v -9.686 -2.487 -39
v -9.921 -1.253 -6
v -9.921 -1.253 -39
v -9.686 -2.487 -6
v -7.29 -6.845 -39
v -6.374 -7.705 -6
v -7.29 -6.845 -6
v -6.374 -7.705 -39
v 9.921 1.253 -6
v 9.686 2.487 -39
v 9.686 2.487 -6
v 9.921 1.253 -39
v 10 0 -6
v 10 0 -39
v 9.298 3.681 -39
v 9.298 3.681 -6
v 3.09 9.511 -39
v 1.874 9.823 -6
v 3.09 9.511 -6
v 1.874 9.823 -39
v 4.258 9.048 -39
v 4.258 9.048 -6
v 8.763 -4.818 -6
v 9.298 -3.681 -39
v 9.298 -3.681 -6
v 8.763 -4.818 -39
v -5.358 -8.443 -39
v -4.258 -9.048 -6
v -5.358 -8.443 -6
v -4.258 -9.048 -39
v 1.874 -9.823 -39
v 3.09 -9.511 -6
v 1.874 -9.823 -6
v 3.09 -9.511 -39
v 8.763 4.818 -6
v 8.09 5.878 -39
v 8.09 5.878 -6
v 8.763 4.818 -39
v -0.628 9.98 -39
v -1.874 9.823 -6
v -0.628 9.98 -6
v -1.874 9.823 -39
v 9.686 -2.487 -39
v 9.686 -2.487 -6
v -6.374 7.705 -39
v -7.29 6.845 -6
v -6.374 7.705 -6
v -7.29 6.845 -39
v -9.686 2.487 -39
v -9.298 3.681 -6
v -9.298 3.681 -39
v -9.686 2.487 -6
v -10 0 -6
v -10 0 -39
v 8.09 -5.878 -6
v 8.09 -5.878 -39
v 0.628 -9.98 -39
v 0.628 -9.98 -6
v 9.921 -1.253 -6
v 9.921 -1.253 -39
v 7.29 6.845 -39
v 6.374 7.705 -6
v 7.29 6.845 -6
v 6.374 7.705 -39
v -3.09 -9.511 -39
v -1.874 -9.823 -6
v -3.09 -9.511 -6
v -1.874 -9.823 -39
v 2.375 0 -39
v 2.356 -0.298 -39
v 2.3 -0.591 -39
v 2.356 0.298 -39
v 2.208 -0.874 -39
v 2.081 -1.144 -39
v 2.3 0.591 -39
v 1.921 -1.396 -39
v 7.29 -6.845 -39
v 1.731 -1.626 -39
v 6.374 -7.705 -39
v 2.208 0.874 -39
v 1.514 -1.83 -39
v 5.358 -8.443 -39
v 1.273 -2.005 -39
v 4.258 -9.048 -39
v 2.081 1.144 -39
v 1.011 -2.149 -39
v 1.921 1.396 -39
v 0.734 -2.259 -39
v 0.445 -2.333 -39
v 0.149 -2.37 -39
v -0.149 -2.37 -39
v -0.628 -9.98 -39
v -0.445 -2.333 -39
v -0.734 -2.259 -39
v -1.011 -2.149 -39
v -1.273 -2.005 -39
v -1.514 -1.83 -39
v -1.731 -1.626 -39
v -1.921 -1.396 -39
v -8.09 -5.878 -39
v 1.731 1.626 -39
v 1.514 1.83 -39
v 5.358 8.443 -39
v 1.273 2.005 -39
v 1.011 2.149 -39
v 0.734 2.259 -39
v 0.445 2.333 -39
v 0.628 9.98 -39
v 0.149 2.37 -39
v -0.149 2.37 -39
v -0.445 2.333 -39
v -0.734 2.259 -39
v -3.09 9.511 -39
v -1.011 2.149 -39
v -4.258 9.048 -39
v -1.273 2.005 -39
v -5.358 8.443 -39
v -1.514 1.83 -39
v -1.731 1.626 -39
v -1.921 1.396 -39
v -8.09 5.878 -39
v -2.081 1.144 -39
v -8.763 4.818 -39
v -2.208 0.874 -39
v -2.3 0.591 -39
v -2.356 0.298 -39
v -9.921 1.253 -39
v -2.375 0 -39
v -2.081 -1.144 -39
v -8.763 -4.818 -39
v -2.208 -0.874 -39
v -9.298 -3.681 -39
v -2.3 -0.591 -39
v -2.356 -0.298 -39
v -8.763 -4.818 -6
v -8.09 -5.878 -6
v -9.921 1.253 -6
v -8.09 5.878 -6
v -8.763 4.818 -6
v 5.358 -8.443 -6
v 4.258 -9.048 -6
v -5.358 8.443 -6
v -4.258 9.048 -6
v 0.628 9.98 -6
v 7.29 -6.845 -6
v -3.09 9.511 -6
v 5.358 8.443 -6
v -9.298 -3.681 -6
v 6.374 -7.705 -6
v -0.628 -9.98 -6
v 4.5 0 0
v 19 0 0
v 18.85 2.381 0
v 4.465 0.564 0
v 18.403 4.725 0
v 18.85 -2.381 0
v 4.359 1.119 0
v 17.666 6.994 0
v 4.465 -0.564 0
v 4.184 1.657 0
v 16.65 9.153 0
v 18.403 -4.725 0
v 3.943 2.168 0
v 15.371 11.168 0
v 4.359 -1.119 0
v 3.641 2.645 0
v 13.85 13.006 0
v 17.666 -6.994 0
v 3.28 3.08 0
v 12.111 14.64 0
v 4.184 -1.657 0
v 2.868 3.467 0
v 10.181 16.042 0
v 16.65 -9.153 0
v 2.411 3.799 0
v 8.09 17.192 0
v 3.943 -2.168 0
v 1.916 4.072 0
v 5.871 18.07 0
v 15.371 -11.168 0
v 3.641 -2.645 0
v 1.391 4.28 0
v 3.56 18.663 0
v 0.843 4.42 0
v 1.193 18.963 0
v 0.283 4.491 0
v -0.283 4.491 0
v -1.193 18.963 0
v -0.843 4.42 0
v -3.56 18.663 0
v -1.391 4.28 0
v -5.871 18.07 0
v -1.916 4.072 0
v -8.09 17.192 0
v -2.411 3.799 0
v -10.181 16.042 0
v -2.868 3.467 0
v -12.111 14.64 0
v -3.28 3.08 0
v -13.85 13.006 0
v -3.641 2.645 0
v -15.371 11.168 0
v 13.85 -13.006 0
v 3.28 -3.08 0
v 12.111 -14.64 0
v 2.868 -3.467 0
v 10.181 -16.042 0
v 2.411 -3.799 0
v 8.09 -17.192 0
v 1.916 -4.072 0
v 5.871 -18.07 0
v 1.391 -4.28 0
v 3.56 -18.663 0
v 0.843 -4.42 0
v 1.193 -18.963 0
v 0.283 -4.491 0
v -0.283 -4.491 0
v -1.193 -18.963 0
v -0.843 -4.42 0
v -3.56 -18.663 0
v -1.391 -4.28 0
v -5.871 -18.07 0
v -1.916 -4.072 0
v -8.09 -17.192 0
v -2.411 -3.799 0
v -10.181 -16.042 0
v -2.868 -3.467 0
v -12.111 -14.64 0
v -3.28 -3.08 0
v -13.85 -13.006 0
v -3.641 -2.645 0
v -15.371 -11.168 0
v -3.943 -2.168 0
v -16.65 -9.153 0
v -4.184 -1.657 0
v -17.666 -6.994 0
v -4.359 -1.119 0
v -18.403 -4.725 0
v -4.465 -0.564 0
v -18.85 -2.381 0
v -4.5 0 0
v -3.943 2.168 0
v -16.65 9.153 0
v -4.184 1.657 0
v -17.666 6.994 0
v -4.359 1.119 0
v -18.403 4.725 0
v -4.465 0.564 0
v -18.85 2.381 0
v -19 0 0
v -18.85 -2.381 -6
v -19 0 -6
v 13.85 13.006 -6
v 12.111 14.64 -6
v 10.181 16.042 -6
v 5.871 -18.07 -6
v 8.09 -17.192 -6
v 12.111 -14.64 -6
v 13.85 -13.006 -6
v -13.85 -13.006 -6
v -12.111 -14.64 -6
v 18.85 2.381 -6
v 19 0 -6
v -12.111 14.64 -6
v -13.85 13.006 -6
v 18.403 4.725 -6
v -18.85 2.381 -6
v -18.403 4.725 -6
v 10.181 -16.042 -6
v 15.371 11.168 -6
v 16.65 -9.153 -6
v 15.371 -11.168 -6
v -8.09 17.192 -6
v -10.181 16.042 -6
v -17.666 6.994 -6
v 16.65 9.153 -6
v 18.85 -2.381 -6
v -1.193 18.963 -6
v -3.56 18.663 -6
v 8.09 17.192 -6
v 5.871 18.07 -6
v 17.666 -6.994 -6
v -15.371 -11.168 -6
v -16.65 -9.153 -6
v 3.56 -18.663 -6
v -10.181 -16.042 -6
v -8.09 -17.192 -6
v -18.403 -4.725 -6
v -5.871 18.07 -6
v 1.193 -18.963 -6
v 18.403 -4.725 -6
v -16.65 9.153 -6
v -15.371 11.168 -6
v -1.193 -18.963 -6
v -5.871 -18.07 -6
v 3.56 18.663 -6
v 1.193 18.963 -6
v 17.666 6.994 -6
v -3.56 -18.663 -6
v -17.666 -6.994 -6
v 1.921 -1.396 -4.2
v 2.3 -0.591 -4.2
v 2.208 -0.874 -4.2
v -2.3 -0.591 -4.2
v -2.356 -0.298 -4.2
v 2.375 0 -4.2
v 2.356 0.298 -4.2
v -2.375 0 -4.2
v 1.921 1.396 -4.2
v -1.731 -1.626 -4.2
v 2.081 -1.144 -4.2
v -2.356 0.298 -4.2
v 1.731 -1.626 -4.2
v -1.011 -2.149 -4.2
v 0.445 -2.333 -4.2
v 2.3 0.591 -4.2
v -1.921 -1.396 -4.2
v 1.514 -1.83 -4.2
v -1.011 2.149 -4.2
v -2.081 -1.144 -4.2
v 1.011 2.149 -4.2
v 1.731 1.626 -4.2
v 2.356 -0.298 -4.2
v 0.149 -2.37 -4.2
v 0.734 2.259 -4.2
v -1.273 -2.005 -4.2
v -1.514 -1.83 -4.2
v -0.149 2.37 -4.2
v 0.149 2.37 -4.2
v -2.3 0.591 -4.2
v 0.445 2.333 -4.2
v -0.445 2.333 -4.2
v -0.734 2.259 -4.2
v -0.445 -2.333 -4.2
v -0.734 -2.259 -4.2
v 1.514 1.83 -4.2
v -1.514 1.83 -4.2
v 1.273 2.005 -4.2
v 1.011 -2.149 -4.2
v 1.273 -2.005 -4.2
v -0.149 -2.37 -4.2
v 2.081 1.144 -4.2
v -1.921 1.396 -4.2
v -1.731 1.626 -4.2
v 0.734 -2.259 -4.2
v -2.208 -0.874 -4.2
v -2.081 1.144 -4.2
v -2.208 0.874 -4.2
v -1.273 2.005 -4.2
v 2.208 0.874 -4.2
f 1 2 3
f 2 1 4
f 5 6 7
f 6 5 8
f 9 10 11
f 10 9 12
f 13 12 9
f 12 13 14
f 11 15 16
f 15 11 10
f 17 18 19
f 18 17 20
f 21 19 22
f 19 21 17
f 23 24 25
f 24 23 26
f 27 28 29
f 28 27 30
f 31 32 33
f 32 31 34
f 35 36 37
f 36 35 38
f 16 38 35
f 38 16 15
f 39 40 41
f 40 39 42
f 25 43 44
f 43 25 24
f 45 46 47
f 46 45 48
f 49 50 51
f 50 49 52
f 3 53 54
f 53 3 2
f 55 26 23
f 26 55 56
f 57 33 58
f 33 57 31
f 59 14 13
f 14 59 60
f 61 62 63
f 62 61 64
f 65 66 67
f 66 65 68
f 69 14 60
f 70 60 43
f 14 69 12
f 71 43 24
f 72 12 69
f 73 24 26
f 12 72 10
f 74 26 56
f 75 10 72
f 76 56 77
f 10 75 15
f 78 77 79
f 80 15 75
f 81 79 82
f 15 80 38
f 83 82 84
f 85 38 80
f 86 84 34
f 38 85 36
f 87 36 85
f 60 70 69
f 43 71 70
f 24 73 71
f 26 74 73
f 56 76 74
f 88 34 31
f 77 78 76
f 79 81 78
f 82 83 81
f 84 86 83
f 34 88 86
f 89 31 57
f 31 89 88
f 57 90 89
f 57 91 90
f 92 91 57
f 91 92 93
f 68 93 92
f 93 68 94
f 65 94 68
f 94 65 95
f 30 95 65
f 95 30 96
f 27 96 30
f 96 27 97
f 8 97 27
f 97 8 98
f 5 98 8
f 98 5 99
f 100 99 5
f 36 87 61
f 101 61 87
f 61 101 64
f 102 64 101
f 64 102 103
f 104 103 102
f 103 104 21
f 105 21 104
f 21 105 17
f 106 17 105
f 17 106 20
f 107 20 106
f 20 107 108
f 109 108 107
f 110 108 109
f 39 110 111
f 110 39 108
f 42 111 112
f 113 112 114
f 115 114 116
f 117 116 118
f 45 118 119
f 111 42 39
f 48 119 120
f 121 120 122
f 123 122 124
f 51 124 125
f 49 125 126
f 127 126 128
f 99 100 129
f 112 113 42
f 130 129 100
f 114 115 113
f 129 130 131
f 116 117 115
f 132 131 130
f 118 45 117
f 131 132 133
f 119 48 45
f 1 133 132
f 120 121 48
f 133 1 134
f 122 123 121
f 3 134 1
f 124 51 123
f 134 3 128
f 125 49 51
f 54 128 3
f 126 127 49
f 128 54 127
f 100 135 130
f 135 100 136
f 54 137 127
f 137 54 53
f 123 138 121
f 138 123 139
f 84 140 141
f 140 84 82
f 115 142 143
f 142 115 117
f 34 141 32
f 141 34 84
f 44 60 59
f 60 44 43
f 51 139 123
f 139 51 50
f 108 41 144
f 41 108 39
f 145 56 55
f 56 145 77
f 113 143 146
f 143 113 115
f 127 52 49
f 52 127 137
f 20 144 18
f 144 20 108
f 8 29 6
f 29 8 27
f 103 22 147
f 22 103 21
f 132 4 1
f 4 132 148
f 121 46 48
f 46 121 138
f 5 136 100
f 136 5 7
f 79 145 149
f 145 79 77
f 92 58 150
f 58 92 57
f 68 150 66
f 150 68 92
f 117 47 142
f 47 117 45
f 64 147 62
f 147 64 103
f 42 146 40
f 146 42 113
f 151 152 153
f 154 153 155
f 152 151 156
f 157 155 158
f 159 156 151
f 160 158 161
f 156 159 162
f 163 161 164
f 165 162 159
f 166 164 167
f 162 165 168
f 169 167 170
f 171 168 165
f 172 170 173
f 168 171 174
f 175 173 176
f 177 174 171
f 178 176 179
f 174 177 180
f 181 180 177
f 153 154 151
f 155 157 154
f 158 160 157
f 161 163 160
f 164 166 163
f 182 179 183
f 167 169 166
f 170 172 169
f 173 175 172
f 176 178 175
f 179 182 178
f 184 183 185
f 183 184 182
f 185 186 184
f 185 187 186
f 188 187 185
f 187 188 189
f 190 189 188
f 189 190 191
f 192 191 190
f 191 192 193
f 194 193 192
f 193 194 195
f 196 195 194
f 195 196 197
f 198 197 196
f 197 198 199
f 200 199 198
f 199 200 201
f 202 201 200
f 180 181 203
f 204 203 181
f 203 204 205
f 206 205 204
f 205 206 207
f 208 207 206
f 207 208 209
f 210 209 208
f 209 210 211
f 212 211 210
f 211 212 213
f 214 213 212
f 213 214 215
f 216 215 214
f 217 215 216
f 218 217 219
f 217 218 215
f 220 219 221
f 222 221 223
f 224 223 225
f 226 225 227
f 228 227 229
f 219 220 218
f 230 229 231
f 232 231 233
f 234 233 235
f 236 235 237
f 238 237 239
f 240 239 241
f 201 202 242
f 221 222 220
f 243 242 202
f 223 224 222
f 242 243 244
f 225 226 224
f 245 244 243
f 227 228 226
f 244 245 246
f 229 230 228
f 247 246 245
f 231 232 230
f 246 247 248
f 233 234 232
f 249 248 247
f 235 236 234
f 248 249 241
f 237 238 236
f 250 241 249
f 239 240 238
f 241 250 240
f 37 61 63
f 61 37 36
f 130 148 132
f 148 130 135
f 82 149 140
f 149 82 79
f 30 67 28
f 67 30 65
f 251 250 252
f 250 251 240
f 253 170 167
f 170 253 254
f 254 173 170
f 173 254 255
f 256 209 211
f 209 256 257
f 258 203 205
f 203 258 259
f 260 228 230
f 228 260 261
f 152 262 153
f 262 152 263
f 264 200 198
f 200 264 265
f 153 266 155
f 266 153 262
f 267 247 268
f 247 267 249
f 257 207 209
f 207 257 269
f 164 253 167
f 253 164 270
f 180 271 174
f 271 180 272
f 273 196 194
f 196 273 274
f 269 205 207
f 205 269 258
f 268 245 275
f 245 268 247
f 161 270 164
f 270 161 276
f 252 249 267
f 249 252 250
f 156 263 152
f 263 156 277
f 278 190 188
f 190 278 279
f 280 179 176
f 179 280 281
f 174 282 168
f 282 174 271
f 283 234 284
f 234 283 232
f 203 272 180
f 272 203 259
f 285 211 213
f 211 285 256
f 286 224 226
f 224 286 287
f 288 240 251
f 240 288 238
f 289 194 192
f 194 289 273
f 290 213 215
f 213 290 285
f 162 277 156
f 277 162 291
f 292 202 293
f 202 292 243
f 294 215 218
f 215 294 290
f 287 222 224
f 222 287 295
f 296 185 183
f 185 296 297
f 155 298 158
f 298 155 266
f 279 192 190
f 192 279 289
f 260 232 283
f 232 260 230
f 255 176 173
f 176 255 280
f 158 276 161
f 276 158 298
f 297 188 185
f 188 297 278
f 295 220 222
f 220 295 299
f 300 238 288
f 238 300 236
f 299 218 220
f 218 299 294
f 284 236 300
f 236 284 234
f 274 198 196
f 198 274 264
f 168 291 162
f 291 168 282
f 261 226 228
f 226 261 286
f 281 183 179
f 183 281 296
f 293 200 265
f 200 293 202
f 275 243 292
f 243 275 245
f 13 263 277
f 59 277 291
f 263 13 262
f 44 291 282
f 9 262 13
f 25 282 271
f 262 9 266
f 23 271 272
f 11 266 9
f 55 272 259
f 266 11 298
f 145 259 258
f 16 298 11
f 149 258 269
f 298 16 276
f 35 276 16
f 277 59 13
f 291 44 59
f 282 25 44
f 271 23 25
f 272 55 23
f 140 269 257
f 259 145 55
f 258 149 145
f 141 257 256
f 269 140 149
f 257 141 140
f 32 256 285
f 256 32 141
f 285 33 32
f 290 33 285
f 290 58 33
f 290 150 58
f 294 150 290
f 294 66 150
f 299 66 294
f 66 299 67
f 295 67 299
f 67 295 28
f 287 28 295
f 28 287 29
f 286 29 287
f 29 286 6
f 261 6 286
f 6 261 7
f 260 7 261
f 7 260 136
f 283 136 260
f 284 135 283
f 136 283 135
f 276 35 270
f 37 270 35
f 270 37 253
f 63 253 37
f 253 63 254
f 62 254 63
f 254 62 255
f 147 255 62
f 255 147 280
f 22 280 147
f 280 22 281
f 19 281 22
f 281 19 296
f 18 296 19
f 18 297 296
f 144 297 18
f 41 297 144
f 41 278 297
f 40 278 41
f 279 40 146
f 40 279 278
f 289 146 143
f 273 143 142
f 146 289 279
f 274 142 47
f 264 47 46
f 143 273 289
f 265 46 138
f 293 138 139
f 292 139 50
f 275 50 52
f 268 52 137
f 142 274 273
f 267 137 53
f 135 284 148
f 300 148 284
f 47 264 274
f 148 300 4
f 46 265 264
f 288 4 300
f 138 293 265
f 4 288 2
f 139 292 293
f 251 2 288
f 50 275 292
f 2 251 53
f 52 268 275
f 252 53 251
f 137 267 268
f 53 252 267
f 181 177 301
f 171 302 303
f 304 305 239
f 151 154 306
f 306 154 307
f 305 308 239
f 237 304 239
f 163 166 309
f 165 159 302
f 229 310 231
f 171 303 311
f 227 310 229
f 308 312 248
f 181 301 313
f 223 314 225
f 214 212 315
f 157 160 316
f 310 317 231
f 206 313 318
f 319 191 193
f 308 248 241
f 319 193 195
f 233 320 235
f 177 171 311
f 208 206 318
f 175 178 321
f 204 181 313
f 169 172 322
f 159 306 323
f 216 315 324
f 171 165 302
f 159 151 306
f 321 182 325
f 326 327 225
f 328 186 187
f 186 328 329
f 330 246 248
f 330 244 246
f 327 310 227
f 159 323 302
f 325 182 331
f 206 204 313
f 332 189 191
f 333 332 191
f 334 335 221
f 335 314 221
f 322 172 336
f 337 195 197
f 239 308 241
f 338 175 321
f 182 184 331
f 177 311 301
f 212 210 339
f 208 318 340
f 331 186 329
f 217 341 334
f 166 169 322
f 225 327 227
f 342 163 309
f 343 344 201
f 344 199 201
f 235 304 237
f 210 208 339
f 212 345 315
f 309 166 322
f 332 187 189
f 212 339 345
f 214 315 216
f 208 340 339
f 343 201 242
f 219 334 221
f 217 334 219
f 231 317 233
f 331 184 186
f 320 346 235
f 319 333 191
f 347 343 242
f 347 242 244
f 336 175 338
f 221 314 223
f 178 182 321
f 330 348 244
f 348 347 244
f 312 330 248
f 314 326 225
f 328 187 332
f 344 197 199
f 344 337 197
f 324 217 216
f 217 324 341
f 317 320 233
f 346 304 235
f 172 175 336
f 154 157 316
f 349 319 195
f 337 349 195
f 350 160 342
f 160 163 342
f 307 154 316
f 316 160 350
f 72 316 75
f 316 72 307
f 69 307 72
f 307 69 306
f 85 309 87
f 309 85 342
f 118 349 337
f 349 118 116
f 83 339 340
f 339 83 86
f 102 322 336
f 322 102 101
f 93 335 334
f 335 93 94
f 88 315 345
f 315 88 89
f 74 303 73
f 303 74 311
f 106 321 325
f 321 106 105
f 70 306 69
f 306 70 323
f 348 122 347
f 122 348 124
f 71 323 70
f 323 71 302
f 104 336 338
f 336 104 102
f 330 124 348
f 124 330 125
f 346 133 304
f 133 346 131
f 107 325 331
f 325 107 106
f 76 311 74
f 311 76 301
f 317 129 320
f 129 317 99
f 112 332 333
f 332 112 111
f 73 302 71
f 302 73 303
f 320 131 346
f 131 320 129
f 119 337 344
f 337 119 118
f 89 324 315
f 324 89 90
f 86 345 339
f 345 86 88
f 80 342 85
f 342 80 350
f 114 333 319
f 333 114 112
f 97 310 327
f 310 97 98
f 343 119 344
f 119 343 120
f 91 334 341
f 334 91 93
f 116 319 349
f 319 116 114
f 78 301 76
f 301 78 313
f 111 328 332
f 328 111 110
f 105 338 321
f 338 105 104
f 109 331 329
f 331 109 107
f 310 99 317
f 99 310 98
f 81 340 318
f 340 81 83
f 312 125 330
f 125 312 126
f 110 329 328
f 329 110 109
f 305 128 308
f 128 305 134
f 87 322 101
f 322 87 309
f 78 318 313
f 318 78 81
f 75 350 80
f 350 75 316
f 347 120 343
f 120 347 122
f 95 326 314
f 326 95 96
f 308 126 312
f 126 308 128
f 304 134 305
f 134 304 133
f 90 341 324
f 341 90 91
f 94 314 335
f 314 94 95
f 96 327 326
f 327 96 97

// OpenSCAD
$fn = 50;


difference() {
	union() {
		translate(v = [0, 0, -39.0000000000]) {
			cylinder(h = 39, r = 10.0000000000);
		}
		translate(v = [0, 0, -6.0000000000]) {
			cylinder(h = 6, r = 19.0000000000);
		}
	}
	union() {
		translate(v = [0, 0, 0]) {
			rotate(a = [0, 0, 0]) {
				difference() {
					union() {
						#translate(v = [0, 0, -39.0000000000]) {
							cylinder(h = 39, r = 2.2500000000);
						}
						#translate(v = [0, 0, -4.2000000000]) {
							cylinder(h = 4.2000000000, r1 = 2.3750000000, r2 = 4.5000000000);
						}
						#translate(v = [0, 0, -39.0000000000]) {
							cylinder(h = 39, r = 2.3750000000);
						}
						#translate(v = [0, 0, -39.0000000000]) {
							cylinder(h = 39, r = 2.2500000000);
						}
					}
					union();
				}
			}
		}
	}
}
